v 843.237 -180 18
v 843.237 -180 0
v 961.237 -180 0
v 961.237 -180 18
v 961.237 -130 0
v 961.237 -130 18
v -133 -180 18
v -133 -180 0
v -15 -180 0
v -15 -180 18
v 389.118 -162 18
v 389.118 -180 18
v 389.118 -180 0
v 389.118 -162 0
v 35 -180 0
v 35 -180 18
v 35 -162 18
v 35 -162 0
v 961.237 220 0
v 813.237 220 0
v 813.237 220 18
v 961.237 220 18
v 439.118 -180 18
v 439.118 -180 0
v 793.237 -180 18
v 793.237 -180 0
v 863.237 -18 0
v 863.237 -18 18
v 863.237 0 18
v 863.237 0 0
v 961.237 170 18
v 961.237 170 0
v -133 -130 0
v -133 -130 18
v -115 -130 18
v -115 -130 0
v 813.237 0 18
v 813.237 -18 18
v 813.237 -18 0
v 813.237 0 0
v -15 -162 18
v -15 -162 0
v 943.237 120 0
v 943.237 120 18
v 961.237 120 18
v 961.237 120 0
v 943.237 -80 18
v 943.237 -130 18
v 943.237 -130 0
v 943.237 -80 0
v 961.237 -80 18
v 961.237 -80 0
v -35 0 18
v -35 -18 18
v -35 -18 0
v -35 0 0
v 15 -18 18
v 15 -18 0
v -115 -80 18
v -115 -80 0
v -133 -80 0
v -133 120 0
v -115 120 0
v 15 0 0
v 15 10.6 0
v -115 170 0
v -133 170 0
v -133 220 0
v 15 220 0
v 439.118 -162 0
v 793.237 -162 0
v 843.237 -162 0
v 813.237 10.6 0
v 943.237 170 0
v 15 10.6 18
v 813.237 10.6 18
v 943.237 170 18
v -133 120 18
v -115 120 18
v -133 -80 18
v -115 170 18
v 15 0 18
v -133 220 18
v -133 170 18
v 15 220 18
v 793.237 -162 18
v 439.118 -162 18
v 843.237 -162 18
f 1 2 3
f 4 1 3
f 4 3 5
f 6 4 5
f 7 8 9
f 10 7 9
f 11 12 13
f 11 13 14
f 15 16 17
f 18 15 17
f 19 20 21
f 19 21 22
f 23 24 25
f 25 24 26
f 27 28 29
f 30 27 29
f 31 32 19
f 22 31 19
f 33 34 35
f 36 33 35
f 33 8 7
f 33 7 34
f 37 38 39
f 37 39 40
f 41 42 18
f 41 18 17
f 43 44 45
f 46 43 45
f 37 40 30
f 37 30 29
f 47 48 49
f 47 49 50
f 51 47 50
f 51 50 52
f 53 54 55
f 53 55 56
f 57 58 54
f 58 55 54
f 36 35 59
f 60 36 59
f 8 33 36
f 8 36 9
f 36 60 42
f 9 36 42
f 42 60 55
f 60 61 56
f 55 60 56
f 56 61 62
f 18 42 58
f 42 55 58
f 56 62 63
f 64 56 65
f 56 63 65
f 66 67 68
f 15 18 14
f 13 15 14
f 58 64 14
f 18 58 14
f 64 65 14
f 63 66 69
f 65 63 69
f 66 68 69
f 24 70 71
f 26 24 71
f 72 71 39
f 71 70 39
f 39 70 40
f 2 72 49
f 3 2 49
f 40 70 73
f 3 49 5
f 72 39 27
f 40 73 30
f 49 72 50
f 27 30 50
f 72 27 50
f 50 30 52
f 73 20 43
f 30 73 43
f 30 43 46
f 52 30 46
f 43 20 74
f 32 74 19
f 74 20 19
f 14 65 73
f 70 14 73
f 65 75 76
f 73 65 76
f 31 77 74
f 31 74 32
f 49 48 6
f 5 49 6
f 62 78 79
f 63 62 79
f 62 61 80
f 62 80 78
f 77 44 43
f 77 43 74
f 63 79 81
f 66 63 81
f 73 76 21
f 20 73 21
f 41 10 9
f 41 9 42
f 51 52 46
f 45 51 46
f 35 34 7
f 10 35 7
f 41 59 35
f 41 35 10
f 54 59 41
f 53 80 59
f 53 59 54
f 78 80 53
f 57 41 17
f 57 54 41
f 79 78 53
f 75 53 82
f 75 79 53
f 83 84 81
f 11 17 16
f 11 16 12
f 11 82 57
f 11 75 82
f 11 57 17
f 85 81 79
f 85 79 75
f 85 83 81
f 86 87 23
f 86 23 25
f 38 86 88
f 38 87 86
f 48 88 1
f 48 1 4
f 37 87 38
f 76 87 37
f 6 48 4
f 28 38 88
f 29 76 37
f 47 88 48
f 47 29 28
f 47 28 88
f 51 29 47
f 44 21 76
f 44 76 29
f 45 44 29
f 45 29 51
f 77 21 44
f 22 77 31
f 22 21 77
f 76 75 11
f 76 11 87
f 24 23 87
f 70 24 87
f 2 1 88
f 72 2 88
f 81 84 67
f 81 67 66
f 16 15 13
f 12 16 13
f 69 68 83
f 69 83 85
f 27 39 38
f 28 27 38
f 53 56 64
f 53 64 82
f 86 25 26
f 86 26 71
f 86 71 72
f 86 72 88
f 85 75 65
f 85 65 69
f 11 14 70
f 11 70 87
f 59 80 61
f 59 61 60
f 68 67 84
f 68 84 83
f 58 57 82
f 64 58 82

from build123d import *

# Parameters (mm, degrees)
SKETCH1_W           = 1094.236516538
SKETCH1_H           = 400
BOSS_EXTRUDE1_DEPTH = 18
CAVITY1_START       = -15
CAVITY1_OUTLINE_W   = 18
CAVITY1_OUTLINE_H   = 18
CAVITY1_DEPTH       = 30
CAVITY1_START_2     = 813.236516538
CAVITY1_2_OUTLINE_W = 18
CAVITY1_2_OUTLINE_H = 18
CAVITY1_2_DEPTH     = 30
CAVITY1_START_3     = 389.118258269
CAVITY1_3_OUTLINE_W = 18
CAVITY1_3_OUTLINE_H = 18
CAVITY1_3_DEPTH     = 50
CAVITY1_START_4     = -35
CAVITY1_4_OUTLINE_W = 18
CAVITY1_4_OUTLINE_H = 18
CAVITY1_4_DEPTH     = 20
CAVITY1_START_5     = 15
CAVITY1_5_OUTLINE_W = 18
CAVITY1_5_OUTLINE_H = 18
CAVITY1_5_DEPTH     = 20
CAVITY1_START_6     = 793.236516538
CAVITY1_6_OUTLINE_W = 18
CAVITY1_6_OUTLINE_H = 18
CAVITY1_6_DEPTH     = 20
CAVITY1_START_7     = 843.236516538
CAVITY1_7_OUTLINE_W = 18
CAVITY1_7_OUTLINE_H = 18
CAVITY1_7_DEPTH     = 20
SKETCH2_W           = 18
SKETCH2_H           = 50
CUT_EXTRUDE1_DEPTH  = 987.255362837
SKETCH3_W           = 798.236516538
SKETCH3_H           = 209.4
CUT_EXTRUDE2_DEPTH  = 18


# Read off the part's stored shape, not the designer's step: Cavity1
with BuildPart() as part:
    # Sketch1 → Boss-Extrude1 (new body)
    with BuildSketch(Plane.XY):
        with Locations((414.118258269, 20)):
            Rectangle(SKETCH1_W, SKETCH1_H)
    extrude(amount=BOSS_EXTRUDE1_DEPTH)

    # Cavity1 outline → Cavity1 (cut)
    with BuildSketch(Plane.YZ.offset(CAVITY1_START)):
        with Locations((-9, 9)):
            Rectangle(CAVITY1_OUTLINE_W, CAVITY1_OUTLINE_H)
        with Locations((-171, 9)):
            Rectangle(CAVITY1_OUTLINE_W, CAVITY1_OUTLINE_H)
    extrude(amount=CAVITY1_DEPTH, mode=Mode.SUBTRACT)

    # Cavity1 2 outline → Cavity1 2 (cut)
    with BuildSketch(Plane.YZ.offset(CAVITY1_START_2)):
        with Locations((-9, 9)):
            Rectangle(CAVITY1_2_OUTLINE_W, CAVITY1_2_OUTLINE_H)
        with Locations((-171, 9)):
            Rectangle(CAVITY1_2_OUTLINE_W, CAVITY1_2_OUTLINE_H)
    extrude(amount=CAVITY1_2_DEPTH, mode=Mode.SUBTRACT)

    # Cavity1 3 outline → Cavity1 3 (cut)
    with BuildSketch(Plane.YZ.offset(CAVITY1_START_3)):
        with Locations((-171, 9)):
            Rectangle(CAVITY1_3_OUTLINE_W, CAVITY1_3_OUTLINE_H)
    extrude(amount=CAVITY1_3_DEPTH, mode=Mode.SUBTRACT)

    # Cavity1 4 outline → Cavity1 4 (cut)
    with BuildSketch(Plane.YZ.offset(CAVITY1_START_4)):
        with Locations((-9, 9)):
            Rectangle(CAVITY1_4_OUTLINE_W, CAVITY1_4_OUTLINE_H)
    extrude(amount=CAVITY1_4_DEPTH, mode=Mode.SUBTRACT)

    # Cavity1 5 outline → Cavity1 5 (cut)
    with BuildSketch(Plane.YZ.offset(CAVITY1_START_5)):
        with Locations((-171, 9)):
            Rectangle(CAVITY1_5_OUTLINE_W, CAVITY1_5_OUTLINE_H)
    extrude(amount=CAVITY1_5_DEPTH, mode=Mode.SUBTRACT)

    # Cavity1 6 outline → Cavity1 6 (cut)
    with BuildSketch(Plane.YZ.offset(CAVITY1_START_6)):
        with Locations((-171, 9)):
            Rectangle(CAVITY1_6_OUTLINE_W, CAVITY1_6_OUTLINE_H)
    extrude(amount=CAVITY1_6_DEPTH, mode=Mode.SUBTRACT)

    # Cavity1 7 outline → Cavity1 7 (cut)
    with BuildSketch(Plane.YZ.offset(CAVITY1_START_7)):
        with Locations((-9, 9)):
            Rectangle(CAVITY1_7_OUTLINE_W, CAVITY1_7_OUTLINE_H)
    extrude(amount=CAVITY1_7_DEPTH, mode=Mode.SUBTRACT)

    # Sketch2 → Cut-Extrude1 (cut, through all)
    with BuildSketch(Plane.XY.offset(18)):
        with Locations((952.236516538, 145)):
            Rectangle(SKETCH2_W, SKETCH2_H)
        with Locations((952.236516538, -105)):
            Rectangle(SKETCH2_W, SKETCH2_H)
        with Locations((-124, -105)):
            Rectangle(SKETCH2_W, SKETCH2_H)
        with Locations((-124, 145)):
            Rectangle(SKETCH2_W, SKETCH2_H)
    extrude(amount=-CUT_EXTRUDE1_DEPTH, mode=Mode.SUBTRACT)

    # Sketch3 → Cut-Extrude2 (cut)
    with BuildSketch(Plane.XY.offset(18)):
        with Locations((414.118258269, 115.3)):
            Rectangle(SKETCH3_W, SKETCH3_H)
    extrude(amount=-CUT_EXTRUDE2_DEPTH, mode=Mode.SUBTRACT)


solid = part.part
